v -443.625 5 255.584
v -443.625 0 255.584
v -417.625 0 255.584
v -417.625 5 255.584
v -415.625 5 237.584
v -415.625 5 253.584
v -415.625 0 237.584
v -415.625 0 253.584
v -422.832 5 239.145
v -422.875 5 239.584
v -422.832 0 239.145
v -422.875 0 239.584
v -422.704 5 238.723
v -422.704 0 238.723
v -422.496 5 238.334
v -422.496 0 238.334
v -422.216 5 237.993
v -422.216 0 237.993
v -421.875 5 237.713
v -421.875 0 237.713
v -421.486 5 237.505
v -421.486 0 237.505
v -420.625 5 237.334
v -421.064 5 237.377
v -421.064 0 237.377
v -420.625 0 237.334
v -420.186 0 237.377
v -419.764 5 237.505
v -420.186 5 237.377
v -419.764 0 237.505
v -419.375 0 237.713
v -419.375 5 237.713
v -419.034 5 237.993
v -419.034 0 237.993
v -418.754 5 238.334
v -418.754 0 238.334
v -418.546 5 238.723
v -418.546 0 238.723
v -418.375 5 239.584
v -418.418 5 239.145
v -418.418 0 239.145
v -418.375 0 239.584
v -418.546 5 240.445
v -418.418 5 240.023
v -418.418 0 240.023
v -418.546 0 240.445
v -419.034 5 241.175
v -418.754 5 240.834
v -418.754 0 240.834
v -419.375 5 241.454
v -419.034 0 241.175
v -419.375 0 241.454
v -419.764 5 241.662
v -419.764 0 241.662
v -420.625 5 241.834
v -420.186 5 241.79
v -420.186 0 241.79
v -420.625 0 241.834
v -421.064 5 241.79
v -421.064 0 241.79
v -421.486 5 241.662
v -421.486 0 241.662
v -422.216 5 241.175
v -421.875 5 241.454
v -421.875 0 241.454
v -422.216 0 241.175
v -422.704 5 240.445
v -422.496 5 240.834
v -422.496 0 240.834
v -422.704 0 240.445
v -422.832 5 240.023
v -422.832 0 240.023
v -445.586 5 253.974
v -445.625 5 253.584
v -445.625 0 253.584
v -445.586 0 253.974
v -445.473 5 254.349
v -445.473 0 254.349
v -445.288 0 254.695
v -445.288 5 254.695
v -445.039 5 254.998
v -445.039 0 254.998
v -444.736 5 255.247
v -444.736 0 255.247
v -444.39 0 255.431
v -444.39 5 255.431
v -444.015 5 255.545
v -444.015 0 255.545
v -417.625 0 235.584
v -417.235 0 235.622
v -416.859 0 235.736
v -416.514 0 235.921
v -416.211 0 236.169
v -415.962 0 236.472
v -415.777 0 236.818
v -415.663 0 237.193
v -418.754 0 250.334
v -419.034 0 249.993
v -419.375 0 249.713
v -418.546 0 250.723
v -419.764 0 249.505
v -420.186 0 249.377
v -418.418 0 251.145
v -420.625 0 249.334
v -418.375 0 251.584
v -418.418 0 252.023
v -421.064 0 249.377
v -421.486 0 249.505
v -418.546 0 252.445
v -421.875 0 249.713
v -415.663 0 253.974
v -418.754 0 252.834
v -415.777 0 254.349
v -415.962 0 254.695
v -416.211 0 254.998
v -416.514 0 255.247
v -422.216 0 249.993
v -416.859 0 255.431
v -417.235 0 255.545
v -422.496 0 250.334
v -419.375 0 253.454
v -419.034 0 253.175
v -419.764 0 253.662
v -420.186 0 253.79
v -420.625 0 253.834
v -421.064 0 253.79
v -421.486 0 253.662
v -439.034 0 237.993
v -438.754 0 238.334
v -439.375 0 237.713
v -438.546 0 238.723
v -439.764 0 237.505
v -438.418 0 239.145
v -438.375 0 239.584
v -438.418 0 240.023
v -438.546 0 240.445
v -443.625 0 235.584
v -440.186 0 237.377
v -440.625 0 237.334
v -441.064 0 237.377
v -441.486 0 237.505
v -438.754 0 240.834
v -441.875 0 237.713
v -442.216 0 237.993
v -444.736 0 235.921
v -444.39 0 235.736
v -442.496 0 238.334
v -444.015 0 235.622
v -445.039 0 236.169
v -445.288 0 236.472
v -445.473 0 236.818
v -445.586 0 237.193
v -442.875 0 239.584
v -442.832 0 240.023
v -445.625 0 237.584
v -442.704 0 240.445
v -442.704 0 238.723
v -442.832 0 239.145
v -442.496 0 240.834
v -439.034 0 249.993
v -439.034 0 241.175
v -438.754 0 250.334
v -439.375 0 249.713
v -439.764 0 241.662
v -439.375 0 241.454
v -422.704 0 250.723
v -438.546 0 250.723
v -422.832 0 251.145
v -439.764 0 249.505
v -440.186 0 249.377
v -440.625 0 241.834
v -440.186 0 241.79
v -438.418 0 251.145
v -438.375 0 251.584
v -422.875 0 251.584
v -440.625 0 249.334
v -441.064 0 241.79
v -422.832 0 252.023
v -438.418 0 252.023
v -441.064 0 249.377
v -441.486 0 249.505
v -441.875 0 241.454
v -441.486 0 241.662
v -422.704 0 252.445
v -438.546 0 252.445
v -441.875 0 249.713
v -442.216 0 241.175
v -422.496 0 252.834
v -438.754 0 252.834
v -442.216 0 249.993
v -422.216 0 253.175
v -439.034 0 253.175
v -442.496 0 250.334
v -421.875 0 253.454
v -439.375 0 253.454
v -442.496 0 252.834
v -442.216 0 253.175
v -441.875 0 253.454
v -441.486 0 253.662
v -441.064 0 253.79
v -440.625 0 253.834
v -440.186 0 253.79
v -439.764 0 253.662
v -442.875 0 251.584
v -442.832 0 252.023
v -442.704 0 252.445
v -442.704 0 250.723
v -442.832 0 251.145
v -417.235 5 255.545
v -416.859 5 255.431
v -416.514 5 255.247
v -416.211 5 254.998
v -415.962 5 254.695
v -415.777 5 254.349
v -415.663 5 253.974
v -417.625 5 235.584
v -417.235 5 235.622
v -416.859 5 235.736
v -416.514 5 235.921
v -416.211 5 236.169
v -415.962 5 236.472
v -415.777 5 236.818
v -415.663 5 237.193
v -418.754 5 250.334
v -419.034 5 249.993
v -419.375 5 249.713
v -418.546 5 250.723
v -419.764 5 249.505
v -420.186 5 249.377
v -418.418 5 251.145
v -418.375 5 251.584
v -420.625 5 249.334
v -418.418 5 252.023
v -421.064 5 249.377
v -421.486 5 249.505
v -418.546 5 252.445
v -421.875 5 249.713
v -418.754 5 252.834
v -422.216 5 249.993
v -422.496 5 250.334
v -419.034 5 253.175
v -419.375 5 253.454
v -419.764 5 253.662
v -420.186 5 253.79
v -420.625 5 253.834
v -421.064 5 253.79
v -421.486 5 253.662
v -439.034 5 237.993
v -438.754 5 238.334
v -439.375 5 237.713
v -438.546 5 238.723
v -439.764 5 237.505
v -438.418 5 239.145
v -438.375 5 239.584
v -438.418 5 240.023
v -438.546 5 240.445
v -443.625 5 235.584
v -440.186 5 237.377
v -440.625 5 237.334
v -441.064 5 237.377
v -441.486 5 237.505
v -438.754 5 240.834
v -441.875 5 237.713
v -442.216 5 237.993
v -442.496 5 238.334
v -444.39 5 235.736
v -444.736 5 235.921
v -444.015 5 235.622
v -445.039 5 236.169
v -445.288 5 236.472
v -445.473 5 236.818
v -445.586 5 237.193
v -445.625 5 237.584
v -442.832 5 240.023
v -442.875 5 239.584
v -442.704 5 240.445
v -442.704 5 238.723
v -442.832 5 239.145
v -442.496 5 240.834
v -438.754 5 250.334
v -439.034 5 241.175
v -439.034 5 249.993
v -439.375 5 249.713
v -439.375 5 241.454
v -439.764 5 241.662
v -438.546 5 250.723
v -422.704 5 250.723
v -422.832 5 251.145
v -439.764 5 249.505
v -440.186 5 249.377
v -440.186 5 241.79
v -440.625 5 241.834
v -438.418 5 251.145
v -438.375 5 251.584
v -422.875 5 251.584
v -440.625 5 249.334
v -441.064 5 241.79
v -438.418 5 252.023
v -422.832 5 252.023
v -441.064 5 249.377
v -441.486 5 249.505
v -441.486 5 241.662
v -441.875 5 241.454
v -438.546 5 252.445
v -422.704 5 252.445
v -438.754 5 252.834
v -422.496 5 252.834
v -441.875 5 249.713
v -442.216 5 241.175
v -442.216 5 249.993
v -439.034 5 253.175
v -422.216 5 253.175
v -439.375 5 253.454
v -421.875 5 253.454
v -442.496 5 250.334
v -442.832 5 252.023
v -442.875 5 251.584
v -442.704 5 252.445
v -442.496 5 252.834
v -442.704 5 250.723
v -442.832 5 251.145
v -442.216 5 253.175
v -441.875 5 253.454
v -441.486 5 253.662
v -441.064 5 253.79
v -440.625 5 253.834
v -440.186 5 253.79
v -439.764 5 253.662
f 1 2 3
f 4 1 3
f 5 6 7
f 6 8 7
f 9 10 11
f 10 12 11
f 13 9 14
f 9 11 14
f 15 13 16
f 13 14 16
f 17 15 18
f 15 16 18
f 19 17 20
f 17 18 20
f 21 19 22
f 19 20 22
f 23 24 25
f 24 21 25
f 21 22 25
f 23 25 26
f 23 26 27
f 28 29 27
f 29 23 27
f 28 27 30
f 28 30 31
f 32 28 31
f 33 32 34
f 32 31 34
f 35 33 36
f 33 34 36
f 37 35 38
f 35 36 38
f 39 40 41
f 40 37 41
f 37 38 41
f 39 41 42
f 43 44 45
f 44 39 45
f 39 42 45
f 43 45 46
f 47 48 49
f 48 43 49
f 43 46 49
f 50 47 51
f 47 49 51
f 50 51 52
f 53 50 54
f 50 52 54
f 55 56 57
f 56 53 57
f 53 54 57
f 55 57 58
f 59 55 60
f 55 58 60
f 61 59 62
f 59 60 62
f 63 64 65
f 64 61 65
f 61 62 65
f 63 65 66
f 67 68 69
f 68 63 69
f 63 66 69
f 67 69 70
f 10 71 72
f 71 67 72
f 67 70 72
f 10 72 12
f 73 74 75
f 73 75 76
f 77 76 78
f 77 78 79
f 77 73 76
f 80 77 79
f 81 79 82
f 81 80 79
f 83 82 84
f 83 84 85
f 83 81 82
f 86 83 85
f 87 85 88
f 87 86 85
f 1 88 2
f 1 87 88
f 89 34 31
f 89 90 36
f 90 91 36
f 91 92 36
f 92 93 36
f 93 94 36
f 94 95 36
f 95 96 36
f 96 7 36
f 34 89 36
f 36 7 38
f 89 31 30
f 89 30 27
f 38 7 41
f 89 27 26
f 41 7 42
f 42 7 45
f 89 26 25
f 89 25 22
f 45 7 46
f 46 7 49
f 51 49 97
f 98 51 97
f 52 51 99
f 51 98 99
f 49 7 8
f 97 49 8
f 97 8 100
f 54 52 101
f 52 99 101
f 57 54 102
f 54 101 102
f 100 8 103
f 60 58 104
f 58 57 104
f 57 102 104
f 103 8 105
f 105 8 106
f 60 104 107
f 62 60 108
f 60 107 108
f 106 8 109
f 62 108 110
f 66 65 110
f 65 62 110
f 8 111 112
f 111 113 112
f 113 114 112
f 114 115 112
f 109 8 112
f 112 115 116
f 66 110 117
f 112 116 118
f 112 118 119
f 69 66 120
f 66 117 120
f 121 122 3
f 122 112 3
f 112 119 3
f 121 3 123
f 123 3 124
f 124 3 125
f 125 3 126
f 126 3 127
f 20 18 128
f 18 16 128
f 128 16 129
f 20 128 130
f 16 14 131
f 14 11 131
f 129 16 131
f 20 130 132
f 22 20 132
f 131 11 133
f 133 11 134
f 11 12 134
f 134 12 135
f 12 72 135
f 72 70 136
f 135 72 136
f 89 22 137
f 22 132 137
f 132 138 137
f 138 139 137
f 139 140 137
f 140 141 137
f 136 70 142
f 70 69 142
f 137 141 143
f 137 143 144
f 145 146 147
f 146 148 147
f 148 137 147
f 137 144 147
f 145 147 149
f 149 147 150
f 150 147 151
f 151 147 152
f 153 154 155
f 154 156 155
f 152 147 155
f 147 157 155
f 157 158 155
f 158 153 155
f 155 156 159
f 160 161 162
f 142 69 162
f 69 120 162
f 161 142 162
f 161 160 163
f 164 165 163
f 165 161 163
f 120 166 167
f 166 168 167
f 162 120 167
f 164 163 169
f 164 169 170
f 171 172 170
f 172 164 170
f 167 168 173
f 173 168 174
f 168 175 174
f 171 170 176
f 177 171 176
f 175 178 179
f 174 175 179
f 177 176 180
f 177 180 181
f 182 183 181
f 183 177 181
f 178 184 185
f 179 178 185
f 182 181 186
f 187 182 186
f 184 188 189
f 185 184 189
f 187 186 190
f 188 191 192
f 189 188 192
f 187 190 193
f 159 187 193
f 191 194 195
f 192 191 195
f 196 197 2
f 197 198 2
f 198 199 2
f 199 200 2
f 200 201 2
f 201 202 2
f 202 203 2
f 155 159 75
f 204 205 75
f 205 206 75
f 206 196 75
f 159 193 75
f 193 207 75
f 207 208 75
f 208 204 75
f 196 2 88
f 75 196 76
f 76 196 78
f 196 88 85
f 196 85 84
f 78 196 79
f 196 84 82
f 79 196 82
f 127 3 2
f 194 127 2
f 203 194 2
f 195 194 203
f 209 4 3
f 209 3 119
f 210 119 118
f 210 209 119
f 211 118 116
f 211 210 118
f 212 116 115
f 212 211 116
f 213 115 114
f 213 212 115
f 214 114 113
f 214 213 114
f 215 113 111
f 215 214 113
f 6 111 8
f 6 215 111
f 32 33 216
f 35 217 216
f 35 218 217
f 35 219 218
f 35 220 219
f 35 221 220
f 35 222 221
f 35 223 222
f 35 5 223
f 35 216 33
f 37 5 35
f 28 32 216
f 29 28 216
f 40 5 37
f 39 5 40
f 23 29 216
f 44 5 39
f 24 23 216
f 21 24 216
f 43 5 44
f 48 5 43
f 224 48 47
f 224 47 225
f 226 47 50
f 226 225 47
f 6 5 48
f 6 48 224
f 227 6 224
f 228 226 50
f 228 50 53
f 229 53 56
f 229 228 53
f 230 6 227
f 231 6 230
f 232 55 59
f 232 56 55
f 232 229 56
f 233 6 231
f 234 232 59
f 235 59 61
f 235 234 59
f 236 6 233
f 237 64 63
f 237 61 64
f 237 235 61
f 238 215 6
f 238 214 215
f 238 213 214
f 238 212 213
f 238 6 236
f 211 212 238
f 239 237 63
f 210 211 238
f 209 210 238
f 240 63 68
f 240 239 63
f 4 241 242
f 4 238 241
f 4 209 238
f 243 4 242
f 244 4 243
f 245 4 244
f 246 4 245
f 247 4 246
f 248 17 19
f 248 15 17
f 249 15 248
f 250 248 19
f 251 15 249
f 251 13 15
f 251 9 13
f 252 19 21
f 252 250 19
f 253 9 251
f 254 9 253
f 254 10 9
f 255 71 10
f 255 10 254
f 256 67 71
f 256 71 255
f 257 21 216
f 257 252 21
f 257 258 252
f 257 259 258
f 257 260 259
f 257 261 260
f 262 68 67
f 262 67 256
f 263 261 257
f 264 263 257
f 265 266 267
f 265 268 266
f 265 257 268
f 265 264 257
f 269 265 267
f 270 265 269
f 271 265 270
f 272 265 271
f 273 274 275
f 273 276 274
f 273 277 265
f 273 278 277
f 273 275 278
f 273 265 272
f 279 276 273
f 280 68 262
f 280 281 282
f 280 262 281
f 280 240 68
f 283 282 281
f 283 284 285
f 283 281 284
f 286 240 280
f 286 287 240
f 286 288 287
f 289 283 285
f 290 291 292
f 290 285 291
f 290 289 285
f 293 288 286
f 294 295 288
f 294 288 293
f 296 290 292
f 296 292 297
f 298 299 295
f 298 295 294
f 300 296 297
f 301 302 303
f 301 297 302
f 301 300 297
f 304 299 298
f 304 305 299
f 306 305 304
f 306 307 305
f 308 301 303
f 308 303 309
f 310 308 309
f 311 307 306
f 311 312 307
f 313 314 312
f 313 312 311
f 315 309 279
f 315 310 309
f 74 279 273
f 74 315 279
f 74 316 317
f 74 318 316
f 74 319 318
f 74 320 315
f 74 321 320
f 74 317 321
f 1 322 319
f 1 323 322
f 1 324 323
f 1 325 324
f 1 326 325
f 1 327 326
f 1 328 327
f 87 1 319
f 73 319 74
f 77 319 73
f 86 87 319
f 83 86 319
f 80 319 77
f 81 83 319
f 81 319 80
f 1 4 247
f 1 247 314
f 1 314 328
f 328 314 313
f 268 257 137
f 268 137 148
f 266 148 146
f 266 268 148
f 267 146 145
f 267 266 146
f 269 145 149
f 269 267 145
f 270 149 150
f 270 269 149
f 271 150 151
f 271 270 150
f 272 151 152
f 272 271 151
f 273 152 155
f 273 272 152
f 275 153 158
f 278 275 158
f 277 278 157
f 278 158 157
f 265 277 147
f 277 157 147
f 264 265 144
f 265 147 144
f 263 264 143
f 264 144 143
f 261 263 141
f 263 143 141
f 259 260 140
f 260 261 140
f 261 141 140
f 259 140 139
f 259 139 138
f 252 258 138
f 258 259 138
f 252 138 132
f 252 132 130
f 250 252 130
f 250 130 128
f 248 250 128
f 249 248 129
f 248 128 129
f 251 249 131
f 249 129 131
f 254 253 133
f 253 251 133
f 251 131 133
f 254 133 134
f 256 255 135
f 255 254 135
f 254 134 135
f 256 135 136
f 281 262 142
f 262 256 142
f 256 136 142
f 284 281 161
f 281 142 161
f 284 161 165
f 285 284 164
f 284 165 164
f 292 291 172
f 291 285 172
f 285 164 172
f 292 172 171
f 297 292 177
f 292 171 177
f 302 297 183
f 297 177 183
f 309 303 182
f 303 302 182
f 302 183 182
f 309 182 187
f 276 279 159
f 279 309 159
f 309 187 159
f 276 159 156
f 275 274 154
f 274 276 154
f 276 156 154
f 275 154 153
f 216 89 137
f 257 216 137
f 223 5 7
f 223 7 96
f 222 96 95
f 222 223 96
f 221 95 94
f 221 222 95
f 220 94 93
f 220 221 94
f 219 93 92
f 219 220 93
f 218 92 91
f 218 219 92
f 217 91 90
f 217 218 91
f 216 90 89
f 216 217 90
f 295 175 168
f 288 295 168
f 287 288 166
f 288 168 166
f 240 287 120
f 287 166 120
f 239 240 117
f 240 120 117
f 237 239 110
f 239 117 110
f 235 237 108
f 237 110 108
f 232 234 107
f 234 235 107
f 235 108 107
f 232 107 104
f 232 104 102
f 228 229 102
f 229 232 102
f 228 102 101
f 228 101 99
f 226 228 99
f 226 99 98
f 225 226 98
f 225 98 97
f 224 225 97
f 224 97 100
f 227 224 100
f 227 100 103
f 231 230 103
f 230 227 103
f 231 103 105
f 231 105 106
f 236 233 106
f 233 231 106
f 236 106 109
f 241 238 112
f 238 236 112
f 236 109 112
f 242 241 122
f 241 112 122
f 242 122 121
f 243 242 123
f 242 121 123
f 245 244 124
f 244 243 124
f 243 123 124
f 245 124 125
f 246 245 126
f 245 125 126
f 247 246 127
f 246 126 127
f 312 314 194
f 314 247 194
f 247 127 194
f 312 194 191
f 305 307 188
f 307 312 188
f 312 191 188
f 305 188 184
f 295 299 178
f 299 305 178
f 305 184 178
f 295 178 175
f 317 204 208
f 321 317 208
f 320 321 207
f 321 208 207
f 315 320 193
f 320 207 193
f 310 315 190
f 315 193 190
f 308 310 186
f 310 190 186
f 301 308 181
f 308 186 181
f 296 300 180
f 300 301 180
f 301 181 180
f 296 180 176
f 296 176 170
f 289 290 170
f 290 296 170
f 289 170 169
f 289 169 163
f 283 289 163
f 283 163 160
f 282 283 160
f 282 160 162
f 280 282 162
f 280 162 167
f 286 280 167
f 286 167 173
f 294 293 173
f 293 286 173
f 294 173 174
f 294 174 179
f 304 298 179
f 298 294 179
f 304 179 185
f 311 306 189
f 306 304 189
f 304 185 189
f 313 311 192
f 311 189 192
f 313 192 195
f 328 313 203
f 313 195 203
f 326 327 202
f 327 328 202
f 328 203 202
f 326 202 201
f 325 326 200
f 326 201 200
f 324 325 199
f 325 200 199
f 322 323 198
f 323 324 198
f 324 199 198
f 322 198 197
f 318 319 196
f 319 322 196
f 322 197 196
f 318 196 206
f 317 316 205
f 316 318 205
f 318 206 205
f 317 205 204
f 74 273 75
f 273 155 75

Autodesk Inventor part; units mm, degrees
ref_plane "YZ Plane" through (0, 0, 0) normal (1, 0, 0) x (0, 1, 0)
ref_plane "XZ Plane" through (0, 0, 0) normal (0, 1, 0) x (-1, 0, 0)
ref_plane "XY Plane" through (0, 0, 0) normal (0, 0, 1) x (1, 0, 0)
sketch "Sketch1" plane through (0, 0, 0) normal (0, 1, 0) x (-1, 0, 0)
  line L0 (445.6248, 255.5836) -> (415.6248, 255.5836)
  line L1 (415.6248, 255.5836) -> (415.6248, 235.5836)
  line L2 (415.6248, 235.5836) -> (445.6248, 235.5836)
  line L3 (445.6248, 235.5836) -> (445.6248, 255.5836)
  circle A0 centre (440.6248, 251.5836) radius 2.25
  circle A1 centre (440.6248, 239.5836) radius 2.25
  circle A2 centre (420.6248, 251.5836) radius 2.25
  circle A3 centre (420.6248, 239.5836) radius 2.25
  dimension "d8" = 4.5
  dimension "d9" = 20
  dimension "d10" = 30
  dimension "d11" = 20
  dimension "d12" = 12
  dimension "d13" = 4
  dimension "d14" = 5
extrude "Extrusion1" add sketch "Sketch1" along normal blind 5
fillet "Fillet1" radius 2 4 edges at (-415.6248, 2.5, 255.5836) (-415.6248, 2.5, 235.5836) (-445.6248, 2.5, 255.5836) (-445.6248, 2.5, 235.5836)
properties part number "beltpress"
